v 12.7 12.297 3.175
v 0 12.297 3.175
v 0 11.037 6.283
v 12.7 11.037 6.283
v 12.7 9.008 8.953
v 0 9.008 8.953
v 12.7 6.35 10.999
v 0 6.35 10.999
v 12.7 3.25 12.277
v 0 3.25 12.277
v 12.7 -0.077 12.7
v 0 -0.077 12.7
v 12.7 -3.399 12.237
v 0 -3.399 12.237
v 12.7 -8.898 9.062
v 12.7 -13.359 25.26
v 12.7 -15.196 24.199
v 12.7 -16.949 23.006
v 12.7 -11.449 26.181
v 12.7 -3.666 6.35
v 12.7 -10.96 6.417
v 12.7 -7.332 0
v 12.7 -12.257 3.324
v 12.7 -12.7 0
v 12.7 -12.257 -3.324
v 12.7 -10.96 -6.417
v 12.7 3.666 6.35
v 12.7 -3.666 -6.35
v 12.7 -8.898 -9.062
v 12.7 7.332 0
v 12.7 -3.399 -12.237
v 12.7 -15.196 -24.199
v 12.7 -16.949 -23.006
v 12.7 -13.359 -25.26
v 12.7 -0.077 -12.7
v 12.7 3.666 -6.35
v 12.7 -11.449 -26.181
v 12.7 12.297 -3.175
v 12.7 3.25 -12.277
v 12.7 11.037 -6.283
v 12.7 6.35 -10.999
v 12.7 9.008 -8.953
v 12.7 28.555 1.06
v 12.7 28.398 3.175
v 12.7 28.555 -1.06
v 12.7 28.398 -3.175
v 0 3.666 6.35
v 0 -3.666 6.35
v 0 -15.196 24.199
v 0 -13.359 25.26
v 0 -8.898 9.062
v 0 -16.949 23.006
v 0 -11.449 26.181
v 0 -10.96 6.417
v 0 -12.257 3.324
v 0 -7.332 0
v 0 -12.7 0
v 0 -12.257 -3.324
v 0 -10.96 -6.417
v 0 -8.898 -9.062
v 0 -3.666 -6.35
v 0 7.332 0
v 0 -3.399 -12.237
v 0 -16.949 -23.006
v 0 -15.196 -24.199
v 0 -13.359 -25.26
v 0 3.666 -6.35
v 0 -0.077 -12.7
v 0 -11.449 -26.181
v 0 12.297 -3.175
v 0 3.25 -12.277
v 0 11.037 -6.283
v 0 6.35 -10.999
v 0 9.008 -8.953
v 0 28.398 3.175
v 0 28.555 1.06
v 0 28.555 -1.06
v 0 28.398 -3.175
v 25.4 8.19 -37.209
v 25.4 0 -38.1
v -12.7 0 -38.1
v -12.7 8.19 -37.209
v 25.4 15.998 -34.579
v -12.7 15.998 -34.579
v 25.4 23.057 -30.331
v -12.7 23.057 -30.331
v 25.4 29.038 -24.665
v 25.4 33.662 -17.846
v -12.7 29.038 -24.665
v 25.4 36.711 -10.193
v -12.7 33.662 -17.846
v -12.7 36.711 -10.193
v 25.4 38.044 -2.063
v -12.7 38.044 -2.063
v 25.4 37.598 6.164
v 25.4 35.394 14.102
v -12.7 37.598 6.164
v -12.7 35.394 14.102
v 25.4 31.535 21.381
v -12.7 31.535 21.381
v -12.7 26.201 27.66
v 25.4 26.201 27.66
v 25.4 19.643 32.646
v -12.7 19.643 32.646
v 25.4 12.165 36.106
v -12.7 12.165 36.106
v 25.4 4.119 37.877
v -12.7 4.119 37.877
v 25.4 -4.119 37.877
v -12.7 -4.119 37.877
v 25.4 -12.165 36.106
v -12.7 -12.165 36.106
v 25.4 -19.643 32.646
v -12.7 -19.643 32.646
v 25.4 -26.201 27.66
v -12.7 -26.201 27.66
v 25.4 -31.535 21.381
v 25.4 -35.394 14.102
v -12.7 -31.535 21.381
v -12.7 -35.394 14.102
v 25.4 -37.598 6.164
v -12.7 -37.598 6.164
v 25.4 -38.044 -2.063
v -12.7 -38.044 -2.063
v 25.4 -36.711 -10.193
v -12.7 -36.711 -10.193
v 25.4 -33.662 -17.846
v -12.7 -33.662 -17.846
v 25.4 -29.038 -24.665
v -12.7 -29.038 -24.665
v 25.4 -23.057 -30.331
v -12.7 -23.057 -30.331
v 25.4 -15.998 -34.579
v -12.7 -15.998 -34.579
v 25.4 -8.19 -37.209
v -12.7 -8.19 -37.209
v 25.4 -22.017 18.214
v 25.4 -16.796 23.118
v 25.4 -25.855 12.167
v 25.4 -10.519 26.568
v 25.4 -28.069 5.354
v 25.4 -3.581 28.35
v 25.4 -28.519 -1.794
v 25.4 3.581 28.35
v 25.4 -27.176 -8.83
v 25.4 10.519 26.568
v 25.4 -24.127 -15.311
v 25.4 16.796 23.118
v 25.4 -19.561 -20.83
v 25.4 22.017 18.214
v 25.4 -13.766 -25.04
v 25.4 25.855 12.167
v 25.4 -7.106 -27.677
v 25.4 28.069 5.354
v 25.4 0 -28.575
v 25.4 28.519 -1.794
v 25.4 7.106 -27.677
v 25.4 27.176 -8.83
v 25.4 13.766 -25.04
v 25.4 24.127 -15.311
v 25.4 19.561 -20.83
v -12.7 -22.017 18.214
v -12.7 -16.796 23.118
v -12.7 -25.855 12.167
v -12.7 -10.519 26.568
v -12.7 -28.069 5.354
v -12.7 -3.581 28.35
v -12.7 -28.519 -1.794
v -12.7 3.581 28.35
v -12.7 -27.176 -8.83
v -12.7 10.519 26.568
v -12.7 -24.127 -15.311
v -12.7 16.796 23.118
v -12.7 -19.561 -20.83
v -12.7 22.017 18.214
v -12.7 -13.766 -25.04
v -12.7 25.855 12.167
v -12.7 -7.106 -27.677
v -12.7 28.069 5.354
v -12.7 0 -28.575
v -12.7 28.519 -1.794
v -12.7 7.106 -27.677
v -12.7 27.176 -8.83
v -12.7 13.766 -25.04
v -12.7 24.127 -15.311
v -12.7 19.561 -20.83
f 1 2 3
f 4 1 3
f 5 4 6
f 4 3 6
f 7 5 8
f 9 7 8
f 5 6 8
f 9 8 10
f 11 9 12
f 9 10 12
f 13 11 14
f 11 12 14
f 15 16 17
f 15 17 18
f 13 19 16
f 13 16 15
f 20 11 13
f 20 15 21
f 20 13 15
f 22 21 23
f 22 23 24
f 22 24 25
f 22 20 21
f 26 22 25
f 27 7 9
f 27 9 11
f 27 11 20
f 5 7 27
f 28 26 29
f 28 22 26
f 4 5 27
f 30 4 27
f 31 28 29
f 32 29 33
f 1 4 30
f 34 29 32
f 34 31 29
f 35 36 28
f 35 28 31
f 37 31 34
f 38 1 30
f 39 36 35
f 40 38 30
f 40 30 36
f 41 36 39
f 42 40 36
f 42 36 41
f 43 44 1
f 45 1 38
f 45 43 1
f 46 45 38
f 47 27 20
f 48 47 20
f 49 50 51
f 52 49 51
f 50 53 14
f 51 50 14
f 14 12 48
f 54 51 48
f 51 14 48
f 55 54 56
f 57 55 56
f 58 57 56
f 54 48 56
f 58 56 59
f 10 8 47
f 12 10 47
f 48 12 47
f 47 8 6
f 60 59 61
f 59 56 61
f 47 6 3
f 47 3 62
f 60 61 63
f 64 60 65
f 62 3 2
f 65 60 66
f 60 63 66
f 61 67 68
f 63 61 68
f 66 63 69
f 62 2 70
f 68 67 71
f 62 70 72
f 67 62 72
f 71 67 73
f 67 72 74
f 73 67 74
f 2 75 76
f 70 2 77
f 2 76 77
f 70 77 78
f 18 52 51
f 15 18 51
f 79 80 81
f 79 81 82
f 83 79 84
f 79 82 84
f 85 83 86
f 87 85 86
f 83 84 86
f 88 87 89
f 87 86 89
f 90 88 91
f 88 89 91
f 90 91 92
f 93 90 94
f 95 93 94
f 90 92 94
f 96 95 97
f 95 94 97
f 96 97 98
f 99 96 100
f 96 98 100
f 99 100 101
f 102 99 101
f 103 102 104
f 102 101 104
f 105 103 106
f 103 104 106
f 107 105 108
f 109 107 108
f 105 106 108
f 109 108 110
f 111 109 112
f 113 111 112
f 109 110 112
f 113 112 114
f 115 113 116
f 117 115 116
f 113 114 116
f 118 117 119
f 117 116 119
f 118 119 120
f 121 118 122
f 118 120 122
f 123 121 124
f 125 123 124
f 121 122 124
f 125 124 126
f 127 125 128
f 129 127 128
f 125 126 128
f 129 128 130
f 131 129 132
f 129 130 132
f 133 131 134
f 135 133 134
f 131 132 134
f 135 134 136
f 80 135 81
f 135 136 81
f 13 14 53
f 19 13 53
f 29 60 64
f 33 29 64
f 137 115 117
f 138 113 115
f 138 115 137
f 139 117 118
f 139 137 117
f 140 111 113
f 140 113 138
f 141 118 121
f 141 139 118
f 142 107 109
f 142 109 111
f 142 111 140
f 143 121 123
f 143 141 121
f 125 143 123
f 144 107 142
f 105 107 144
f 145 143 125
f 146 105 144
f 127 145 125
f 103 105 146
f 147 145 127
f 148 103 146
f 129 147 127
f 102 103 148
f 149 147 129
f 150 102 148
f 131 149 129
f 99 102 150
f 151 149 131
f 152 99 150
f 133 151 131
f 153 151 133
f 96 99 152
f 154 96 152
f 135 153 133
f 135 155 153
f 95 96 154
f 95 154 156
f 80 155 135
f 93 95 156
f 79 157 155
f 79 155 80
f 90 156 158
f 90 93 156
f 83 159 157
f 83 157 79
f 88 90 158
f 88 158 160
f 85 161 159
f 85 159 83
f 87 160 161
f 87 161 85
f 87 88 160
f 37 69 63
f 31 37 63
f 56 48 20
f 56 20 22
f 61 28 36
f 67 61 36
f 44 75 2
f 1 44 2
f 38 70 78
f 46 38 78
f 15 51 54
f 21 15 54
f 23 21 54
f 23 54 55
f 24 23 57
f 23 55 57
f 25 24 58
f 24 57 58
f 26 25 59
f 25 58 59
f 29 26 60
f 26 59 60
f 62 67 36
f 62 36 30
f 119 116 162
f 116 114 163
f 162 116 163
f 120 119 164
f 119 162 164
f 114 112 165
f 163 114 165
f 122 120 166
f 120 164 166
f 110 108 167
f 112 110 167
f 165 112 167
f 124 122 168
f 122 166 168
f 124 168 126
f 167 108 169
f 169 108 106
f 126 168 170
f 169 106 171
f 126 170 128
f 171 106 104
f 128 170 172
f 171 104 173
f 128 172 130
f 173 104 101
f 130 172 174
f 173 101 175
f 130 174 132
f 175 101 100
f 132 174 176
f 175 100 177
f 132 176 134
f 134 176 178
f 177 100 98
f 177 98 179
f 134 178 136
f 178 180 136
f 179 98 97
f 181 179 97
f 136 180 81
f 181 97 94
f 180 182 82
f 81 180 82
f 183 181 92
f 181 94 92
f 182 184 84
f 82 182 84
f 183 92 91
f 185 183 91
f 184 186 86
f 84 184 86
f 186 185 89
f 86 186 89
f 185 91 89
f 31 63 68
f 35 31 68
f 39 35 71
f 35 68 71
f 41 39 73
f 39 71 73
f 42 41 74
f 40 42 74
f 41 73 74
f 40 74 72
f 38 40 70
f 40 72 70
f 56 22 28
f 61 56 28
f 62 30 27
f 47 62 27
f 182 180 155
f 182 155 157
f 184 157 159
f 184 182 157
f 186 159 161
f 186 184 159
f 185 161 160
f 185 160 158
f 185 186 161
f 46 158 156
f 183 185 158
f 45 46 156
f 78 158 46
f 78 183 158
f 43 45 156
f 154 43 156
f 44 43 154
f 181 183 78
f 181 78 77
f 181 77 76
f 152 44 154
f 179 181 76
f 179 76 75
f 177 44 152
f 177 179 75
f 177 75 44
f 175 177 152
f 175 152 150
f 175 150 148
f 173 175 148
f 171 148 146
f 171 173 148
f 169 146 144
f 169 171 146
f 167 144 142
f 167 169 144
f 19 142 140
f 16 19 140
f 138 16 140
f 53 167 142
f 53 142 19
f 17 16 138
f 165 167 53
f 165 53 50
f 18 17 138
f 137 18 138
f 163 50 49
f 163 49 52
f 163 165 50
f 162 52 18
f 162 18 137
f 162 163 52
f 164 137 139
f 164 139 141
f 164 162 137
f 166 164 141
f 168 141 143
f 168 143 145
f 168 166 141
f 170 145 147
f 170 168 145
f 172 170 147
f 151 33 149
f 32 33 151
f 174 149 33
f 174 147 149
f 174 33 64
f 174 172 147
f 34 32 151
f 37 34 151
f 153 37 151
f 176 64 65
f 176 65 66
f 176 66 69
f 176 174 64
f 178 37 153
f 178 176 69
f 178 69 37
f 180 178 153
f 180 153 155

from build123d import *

# Parameters (mm, degrees)
BOSS_EXTRUDE1_DEPTH = 12.7
BOSS_EXTRUDE2_START = -38.1
SKETCH2_R           = 38.1
SKETCH2_R_2         = 28.575
BOSS_EXTRUDE2_DEPTH = 38.1
CUT_EXTRUDE1_DEPTH  = 38.1


with BuildPart() as part:
    # Sketch1 → Boss-Extrude1 (new body)
    with BuildSketch(Plane(origin=(0, 0, 0), x_dir=(0, 0, -1), z_dir=(1, 0, 0))):
        with BuildLine():
            ThreePointArc((3.175, 28.398063314), (0, 28.575), (-3.175, 28.398063314))
            Line((-3.175, 28.398063314), (-3.175, 12.296722124))
            ThreePointArc((-3.175, 12.296722124), (-10.998522628, 6.35), (-12.236773743, -3.398730405))
            Line((-12.236773743, -3.398730405), (-26.180944248, -11.449401))
            ThreePointArc((-26.180944248, -11.449401), (-24.746675913, -14.2875), (-23.005944248, -16.948662314))
            Line((-23.005944248, -16.948662314), (-9.061773743, -8.897991719))
            ThreePointArc((-9.061773743, -8.897991719), (0, -12.7), (9.061773743, -8.897991719))
            Line((9.061773743, -8.897991719), (23.005944248, -16.948662314))
            ThreePointArc((23.005944248, -16.948662314), (24.746675913, -14.2875), (26.180944248, -11.449401))
            Line((26.180944248, -11.449401), (12.236773743, -3.398730405))
            ThreePointArc((12.236773743, -3.398730405), (10.998522628, 6.35), (3.175, 12.296722124))
            Line((3.175, 12.296722124), (3.175, 28.398063314))
        make_face()
    extrude(amount=BOSS_EXTRUDE1_DEPTH)

    # Sketch2 → Boss-Extrude2 (add)
    with BuildSketch(Plane(origin=(25.4, 0, 0), x_dir=(0, 0, -1), z_dir=(1, 0, 0)).offset(BOSS_EXTRUDE2_START)):
        Circle(SKETCH2_R)
        Circle(SKETCH2_R_2, mode=Mode.SUBTRACT)
    extrude(amount=BOSS_EXTRUDE2_DEPTH)

    # Sketch3 → Cut-Extrude1 (cut)
    with BuildSketch(Plane(origin=(12.7, 0, 0), x_dir=(0, 0, -1), z_dir=(1, 0, 0))):
        Polygon((0, 7.332348419), (-6.35, 3.666174209), (-6.35, -3.666174209), (0, -7.332348419), (6.35, -3.666174209), (6.35, 3.666174209), align=None)
    extrude(amount=-CUT_EXTRUDE1_DEPTH, mode=Mode.SUBTRACT)


solid = part.part
